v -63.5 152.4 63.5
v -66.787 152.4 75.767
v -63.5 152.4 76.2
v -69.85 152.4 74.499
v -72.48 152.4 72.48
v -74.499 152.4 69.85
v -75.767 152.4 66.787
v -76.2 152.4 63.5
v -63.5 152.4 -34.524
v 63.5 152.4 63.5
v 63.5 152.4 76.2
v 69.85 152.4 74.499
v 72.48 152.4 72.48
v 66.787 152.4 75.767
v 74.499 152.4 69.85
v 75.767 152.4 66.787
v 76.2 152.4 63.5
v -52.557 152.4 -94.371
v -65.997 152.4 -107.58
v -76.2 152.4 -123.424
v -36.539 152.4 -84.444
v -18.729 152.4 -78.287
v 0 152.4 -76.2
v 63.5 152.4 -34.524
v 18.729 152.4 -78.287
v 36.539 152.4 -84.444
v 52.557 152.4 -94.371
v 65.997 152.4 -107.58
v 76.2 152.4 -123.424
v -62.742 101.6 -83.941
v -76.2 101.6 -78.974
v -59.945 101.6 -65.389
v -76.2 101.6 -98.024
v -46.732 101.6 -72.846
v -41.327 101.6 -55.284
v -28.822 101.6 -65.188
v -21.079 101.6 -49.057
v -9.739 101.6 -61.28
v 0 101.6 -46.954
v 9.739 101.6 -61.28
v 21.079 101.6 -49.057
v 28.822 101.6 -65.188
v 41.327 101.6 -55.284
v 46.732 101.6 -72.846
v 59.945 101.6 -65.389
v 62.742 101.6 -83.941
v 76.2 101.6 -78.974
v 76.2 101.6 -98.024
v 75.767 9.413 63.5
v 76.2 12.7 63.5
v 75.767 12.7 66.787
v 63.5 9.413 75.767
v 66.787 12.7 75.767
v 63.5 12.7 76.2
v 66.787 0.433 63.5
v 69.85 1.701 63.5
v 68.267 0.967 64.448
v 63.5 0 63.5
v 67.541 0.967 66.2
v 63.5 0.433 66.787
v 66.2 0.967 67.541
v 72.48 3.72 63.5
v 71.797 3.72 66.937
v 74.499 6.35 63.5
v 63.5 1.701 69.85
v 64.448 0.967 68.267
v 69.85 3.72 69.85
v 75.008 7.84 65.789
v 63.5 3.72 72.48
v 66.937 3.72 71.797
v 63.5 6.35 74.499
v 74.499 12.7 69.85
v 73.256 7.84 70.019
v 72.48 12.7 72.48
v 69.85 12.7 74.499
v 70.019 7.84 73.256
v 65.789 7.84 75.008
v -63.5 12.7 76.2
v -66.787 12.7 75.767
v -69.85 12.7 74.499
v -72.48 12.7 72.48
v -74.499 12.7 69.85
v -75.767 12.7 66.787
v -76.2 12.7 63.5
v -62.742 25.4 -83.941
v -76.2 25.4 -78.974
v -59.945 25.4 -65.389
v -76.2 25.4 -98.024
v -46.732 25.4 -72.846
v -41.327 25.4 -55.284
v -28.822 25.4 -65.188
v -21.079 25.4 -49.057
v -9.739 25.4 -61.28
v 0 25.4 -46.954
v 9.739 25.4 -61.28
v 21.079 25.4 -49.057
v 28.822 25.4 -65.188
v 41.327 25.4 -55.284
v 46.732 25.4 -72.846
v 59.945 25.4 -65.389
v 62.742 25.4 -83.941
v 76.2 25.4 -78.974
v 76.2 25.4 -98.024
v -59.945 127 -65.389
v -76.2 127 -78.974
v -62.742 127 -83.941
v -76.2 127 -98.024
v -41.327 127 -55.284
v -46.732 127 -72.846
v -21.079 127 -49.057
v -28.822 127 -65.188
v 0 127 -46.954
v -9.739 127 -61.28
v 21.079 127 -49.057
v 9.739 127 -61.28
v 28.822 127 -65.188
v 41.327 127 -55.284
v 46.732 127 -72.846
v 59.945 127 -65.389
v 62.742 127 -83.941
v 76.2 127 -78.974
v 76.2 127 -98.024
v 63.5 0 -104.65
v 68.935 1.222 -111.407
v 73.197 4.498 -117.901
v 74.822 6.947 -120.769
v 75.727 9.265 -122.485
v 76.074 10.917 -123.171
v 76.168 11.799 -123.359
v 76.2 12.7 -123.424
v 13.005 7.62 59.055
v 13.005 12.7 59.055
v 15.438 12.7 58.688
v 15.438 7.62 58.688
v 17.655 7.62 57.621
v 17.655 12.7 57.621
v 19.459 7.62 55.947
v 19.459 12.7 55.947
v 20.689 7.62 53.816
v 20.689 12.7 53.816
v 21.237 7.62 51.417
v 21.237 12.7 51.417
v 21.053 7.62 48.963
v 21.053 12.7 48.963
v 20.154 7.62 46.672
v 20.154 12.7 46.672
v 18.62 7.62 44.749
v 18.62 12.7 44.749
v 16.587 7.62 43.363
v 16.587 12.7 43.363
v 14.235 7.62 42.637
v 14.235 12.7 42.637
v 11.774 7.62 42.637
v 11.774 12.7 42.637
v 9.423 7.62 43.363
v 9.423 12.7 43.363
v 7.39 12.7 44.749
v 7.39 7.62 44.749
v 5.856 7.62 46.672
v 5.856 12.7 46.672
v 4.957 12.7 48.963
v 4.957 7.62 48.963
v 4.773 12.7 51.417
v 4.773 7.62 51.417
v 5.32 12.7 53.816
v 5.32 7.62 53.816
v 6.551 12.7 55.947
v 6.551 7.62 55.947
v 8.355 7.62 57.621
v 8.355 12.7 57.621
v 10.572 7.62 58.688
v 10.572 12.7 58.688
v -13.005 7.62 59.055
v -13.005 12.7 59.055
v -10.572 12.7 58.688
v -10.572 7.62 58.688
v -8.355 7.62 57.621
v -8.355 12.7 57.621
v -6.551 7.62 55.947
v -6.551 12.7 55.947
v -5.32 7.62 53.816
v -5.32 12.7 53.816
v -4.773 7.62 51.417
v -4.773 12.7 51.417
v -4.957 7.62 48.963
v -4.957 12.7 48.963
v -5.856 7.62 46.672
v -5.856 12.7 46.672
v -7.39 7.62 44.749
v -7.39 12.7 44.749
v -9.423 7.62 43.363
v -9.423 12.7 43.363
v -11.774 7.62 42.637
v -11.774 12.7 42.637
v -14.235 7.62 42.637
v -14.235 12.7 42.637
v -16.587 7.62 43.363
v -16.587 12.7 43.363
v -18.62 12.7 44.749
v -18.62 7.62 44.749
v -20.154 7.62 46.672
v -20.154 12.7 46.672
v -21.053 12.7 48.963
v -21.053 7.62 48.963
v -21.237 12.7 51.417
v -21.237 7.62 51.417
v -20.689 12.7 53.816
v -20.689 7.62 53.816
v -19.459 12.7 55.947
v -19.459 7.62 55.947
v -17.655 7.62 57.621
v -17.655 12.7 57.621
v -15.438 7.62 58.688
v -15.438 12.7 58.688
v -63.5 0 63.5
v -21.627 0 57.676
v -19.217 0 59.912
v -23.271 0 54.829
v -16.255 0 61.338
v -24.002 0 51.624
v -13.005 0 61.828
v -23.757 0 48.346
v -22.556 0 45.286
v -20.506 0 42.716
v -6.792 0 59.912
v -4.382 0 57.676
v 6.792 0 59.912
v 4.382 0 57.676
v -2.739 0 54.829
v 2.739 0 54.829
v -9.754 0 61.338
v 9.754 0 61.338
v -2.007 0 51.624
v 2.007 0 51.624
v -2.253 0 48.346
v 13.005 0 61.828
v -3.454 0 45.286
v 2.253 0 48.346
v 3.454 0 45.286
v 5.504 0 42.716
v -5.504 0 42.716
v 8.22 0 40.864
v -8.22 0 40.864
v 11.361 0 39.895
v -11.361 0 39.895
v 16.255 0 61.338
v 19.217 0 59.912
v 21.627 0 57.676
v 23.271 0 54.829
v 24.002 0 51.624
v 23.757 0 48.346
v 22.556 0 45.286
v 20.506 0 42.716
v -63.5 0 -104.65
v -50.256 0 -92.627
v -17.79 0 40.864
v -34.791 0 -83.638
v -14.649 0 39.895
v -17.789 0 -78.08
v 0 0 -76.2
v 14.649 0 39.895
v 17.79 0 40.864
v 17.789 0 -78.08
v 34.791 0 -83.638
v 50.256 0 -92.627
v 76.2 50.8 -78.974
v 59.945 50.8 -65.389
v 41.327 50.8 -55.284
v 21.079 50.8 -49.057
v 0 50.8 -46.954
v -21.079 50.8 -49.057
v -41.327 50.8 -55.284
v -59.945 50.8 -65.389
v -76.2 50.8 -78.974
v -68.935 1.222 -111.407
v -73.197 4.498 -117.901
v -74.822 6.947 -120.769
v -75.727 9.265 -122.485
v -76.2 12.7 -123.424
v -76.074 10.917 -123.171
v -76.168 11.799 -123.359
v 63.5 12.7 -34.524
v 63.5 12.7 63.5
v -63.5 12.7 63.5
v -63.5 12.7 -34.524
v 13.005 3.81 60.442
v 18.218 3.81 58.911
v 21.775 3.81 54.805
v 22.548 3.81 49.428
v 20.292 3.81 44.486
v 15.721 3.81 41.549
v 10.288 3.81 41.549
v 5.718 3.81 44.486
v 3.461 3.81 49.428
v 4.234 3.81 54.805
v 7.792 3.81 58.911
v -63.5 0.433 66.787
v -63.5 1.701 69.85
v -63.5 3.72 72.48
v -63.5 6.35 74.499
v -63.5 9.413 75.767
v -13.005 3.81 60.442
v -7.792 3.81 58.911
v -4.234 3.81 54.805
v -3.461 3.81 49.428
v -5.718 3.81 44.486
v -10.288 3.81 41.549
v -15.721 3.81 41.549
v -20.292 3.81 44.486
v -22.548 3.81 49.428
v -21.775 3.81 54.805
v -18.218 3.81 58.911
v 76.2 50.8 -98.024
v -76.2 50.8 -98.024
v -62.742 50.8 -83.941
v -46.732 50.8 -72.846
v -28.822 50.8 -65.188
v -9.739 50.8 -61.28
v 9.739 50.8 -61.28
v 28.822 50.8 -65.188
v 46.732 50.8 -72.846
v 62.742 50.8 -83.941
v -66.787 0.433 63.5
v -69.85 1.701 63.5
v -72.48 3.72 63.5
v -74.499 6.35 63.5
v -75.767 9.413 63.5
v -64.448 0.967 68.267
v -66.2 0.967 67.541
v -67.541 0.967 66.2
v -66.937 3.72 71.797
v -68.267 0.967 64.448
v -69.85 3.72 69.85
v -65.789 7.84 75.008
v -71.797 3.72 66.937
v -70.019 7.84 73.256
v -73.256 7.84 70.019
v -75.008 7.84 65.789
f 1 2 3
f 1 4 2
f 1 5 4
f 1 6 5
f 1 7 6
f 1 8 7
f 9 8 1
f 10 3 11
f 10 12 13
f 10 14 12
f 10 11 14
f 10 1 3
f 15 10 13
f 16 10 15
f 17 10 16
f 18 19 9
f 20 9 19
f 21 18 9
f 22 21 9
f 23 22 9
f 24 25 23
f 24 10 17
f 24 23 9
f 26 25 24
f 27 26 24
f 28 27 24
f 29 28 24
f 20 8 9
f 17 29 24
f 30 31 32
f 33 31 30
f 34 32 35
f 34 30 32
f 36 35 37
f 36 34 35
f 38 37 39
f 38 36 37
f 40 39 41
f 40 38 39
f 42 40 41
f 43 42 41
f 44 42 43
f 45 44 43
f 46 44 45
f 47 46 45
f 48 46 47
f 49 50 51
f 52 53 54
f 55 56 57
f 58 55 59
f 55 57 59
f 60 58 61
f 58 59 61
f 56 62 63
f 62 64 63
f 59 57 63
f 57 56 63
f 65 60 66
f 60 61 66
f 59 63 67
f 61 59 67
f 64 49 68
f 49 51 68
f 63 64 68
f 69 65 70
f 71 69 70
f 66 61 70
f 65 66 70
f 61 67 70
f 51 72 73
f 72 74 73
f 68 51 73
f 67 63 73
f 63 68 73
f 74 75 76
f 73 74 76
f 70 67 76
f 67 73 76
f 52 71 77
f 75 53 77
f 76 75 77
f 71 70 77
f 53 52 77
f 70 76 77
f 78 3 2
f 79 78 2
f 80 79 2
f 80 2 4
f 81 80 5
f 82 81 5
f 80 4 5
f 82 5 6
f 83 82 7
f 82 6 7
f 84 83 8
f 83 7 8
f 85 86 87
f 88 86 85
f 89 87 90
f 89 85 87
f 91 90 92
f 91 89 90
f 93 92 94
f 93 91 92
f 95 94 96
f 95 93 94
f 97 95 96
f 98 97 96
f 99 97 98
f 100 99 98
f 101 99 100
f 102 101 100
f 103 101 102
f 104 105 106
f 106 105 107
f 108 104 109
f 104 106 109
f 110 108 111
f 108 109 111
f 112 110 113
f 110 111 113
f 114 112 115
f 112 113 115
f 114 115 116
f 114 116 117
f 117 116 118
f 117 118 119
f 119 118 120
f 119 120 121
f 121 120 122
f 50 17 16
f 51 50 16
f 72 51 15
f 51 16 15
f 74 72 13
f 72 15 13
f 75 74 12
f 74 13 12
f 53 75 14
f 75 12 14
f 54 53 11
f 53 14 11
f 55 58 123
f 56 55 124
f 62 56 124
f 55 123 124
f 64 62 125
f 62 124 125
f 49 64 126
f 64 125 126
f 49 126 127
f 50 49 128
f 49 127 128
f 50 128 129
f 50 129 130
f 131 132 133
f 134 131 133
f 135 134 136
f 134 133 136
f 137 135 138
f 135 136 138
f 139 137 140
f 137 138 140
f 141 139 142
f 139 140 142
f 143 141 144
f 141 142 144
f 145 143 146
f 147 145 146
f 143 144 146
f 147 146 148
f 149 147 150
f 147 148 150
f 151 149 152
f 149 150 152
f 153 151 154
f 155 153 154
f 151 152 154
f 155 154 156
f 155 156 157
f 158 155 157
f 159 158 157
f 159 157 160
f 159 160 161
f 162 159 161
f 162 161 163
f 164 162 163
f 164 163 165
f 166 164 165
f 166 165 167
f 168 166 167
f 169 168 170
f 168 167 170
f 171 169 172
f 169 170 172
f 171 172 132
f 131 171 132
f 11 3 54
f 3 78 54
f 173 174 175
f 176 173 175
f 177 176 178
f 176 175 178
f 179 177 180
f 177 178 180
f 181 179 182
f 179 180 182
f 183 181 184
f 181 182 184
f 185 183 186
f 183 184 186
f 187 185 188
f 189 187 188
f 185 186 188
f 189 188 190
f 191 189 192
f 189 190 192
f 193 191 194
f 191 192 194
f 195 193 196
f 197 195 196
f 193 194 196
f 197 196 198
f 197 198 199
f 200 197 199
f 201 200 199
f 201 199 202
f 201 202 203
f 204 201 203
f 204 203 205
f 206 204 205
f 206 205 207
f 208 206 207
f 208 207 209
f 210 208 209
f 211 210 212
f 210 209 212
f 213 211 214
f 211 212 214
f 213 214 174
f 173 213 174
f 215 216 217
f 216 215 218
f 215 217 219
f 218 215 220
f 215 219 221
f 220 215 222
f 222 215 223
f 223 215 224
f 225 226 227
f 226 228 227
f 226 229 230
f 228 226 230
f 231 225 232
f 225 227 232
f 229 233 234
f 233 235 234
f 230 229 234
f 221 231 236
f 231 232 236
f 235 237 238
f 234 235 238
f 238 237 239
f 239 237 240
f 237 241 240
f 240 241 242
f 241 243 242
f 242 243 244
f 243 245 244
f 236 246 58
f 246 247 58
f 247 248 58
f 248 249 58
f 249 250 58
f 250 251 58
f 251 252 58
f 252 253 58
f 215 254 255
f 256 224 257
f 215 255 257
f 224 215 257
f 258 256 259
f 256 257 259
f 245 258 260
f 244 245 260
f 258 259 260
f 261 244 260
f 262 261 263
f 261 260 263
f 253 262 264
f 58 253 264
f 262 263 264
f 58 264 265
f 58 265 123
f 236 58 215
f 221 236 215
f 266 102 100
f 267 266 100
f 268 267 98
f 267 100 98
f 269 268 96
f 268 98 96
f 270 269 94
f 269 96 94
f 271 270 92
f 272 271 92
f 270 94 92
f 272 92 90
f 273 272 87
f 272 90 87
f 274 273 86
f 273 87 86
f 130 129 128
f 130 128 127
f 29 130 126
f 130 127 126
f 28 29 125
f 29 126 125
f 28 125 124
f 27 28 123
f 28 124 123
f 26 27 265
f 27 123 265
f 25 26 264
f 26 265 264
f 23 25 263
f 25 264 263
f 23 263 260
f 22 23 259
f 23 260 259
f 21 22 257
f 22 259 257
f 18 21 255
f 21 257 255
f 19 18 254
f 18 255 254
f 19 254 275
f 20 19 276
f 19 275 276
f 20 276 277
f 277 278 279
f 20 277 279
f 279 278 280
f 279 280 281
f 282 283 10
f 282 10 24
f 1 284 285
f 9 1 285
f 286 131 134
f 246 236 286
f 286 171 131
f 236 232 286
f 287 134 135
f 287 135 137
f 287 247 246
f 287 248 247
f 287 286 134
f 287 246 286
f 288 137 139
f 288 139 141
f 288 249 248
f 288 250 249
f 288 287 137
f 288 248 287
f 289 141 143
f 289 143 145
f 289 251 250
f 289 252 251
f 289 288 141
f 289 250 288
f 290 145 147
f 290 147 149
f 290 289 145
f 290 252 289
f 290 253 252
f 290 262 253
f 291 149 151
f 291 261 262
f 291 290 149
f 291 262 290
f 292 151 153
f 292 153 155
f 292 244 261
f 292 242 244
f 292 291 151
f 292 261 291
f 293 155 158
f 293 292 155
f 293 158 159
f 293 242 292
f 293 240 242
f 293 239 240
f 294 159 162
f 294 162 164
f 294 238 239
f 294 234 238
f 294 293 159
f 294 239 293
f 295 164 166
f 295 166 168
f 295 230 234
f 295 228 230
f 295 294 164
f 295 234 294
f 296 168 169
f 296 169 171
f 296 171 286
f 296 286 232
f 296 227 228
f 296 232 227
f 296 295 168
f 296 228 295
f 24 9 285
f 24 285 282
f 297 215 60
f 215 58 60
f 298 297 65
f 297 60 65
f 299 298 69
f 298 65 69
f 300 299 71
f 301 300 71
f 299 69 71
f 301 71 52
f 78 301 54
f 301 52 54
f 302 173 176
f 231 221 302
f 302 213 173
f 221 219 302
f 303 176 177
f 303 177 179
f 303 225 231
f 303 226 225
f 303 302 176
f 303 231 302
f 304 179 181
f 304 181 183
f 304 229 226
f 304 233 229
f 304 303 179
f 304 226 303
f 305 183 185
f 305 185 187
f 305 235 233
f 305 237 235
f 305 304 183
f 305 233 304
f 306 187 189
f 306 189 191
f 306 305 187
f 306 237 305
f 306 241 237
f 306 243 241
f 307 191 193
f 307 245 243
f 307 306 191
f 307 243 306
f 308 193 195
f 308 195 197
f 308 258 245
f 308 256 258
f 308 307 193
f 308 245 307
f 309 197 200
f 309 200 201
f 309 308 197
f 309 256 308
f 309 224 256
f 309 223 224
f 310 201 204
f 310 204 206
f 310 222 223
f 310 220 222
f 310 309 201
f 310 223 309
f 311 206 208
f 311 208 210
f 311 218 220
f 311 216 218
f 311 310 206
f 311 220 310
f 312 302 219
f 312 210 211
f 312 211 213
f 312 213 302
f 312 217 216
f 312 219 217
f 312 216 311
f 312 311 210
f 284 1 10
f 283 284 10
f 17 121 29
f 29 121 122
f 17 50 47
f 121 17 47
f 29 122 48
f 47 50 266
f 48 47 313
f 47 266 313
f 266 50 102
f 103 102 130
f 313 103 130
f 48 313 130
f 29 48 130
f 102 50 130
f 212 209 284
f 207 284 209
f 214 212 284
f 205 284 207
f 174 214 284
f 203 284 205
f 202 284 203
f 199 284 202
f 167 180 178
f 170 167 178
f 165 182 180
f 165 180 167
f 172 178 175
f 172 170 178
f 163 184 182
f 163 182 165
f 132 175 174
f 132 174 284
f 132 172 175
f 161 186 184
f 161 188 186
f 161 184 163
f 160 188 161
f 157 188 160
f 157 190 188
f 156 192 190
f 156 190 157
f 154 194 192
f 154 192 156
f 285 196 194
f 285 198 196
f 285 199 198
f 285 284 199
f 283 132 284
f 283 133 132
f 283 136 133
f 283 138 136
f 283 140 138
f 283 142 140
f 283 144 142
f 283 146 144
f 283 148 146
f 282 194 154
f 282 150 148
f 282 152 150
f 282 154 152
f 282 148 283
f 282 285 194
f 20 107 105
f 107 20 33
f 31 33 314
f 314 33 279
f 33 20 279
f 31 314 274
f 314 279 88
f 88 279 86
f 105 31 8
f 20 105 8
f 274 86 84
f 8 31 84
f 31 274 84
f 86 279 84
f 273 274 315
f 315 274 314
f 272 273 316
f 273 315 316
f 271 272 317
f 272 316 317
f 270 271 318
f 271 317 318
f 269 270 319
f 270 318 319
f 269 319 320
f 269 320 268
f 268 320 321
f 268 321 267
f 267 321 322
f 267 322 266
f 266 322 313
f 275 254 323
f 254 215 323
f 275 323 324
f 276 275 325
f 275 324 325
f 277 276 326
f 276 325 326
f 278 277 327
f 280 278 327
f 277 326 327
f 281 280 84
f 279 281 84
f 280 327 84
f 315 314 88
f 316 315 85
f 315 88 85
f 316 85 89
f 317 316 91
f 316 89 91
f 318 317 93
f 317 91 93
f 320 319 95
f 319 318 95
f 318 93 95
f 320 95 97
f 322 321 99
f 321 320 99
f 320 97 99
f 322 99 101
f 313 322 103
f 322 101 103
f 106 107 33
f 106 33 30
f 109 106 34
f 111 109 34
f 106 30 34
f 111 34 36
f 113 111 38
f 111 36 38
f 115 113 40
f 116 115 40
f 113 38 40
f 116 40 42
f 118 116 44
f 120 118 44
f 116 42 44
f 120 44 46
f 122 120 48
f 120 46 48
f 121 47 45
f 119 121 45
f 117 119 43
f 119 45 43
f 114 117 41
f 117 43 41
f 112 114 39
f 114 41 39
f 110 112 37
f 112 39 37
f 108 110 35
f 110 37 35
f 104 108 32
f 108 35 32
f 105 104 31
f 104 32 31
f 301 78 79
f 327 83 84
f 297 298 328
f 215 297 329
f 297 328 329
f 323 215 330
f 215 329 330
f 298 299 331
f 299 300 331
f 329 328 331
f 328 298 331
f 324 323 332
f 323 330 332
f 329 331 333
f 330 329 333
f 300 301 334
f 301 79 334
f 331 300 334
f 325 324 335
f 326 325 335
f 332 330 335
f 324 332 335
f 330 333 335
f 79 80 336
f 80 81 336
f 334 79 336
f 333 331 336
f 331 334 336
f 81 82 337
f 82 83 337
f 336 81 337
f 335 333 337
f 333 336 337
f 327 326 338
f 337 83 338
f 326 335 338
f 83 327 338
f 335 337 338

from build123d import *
from OCP.BRepFilletAPI import BRepFilletAPI_MakeChamfer

# Parameters (mm, degrees)
SKETCH2_W           = 152.4
SKETCH2_H           = 152.4
BOSS_EXTRUDE1_DEPTH = 25.4
BOSS_EXTRUDE2_DEPTH = 101.6
BOSS_EXTRUDE5_START = 50.8
BOSS_EXTRUDE5_DEPTH = 50.8
BOSS_EXTRUDE6_DEPTH = 25.4
SKETCH6_W           = 127
SKETCH6_H           = 98.02354915
CUT_EXTRUDE1_DEPTH  = 139.7
SKETCH7_R           = 8.255
CUT_EXTRUDE2_DEPTH  = 12.7
CHAMFER1_SIZE       = 7.62
CHAMFER1_SIZE2      = 2.773453185
FILLET1_R           = 12.7


with BuildPart() as part:
    # Sketch2 → Boss-Extrude1 (new body)
    with BuildSketch(Plane(origin=(0, 0, 0), x_dir=(1, 0, 0), z_dir=(0, 1, 0))):
        with BuildLine():
            Line((0, 76.2), (76.2, 76.2))
            Line((76.2, 76.2), (76.2, 123.42354915))
            ThreePointArc((76.2, 123.42354915), (44.823274072, 88.963087986), (0, 76.2))
        make_face()
        with BuildLine():
            Line((-76.2, 123.42354915), (-76.2, 76.2))
            Line((-76.2, 76.2), (0, 76.2))
            ThreePointArc((0, 76.2), (-44.823274072, 88.963087986), (-76.2, 123.42354915))
        make_face()
        Rectangle(SKETCH2_W, SKETCH2_H)
    extrude(amount=BOSS_EXTRUDE1_DEPTH)

    # Sketch3 → Boss-Extrude2 (add)
    with BuildSketch(Plane(origin=(0, 25.4, 0), x_dir=(1, 0, 0), z_dir=(0, 1, 0))):
        with BuildLine():
            ThreePointArc((76.2, 123.42354915), (0, 76.2), (-76.2, 123.42354915))
            Line((-76.2, 123.42354915), (-76.2, 98.02354915))
            ThreePointArc((-76.2, 98.02354915), (0, 60.787742764), (76.2, 98.02354915))
            Line((76.2, 98.02354915), (76.2, 123.42354915))
        make_face()
        with BuildLine():
            ThreePointArc((76.2, 78.97354915), (0, 46.95399651), (-76.2, 78.97354915))
            Line((-76.2, 78.97354915), (-76.2, -76.2))
            Line((-76.2, -76.2), (76.2, -76.2))
            Line((76.2, -76.2), (76.2, 78.97354915))
        make_face()
    extrude(amount=BOSS_EXTRUDE2_DEPTH)

    # Sketch5 → Boss-Extrude5 (add)
    with BuildSketch(Plane(origin=(0, 0, 0), x_dir=(1, 0, 0), z_dir=(0, 1, 0)).offset(BOSS_EXTRUDE5_START)):
        with BuildLine():
            Line((-76.2, 123.42354915), (-76.2, -76.2))
            Line((-76.2, -76.2), (76.2, -76.2))
            Line((76.2, -76.2), (76.2, 123.42354915))
            ThreePointArc((76.2, 123.42354915), (0, 76.2), (-76.2, 123.42354915))
        make_face()
    extrude(amount=BOSS_EXTRUDE5_DEPTH)

    # Sketch4 → Boss-Extrude6 (add)
    with BuildSketch(Plane(origin=(0, 127, 0), x_dir=(1, 0, 0), z_dir=(0, 1, 0))):
        with BuildLine():
            Line((-76.2, 123.42354915), (-76.2, -76.2))
            Line((-76.2, -76.2), (76.2, -76.2))
            Line((76.2, -76.2), (76.2, 123.42354915))
            ThreePointArc((76.2, 123.42354915), (0, 76.2), (-76.2, 123.42354915))
        make_face()
    extrude(amount=BOSS_EXTRUDE6_DEPTH)

    # Sketch6 → Cut-Extrude1 (cut)
    with BuildSketch(Plane(origin=(0, 152.4, 0), x_dir=(1, 0, 0), z_dir=(0, 1, 0))):
        with Locations((0, -14.488225425)):
            Rectangle(SKETCH6_W, SKETCH6_H)
    extrude(amount=-CUT_EXTRUDE1_DEPTH, mode=Mode.SUBTRACT)

    # Sketch7 → Cut-Extrude2 (cut)
    with BuildSketch(Plane(origin=(0, 12.7, 0), x_dir=(1, 0, 0), z_dir=(0, 1, 0))):
        with Locations(Location((-13.0048, -50.8, 0), (0, 0, 270))):
            Circle(SKETCH7_R)
        with Locations(Location((13.0048, -50.8, 0), (0, 0, 270))):
            Circle(SKETCH7_R)
    extrude(amount=-CUT_EXTRUDE2_DEPTH, mode=Mode.SUBTRACT)

    # Chamfer1: one chamfer whose edges measure the first distance from different faces: ONE call of the kernel's chamfer builder (chamfer() names one face for all edges)
    chamfer1_edges_1 = [part.edges().sort_by_distance(p)[0] for p in [
        (-13.0048, 0, 42.545),
    ]]
    chamfer1_side_1 = [part.faces().sort_by_distance(p)[0] for p in [
        (-13.0048, 6.35, 42.545),
    ]]
    chamfer1_edges_2 = [part.edges().sort_by_distance(p)[0] for p in [
        (13.0048, 0, 42.545),
    ]]
    chamfer1_side_2 = [part.faces().sort_by_distance(p)[0] for p in [
        (13.0048, 6.35, 42.545),
    ]]
    chamfer1 = BRepFilletAPI_MakeChamfer(part.part.solid().wrapped)
    for e in chamfer1_edges_1:
        chamfer1.Add(CHAMFER1_SIZE, CHAMFER1_SIZE2, e.wrapped, chamfer1_side_1[0].wrapped)  # the first distance lies on this face
    for e in chamfer1_edges_2:
        chamfer1.Add(CHAMFER1_SIZE, CHAMFER1_SIZE2, e.wrapped, chamfer1_side_2[0].wrapped)  # the first distance lies on this face
    add(Compound.cast(chamfer1.Shape()), mode=Mode.REPLACE)

    # Fillet1
    fillet1_edges = [part.edges().sort_by_distance(p)[0] for p in [
        (76.2, 76.2, 76.2),
        (-76.2, 76.2, 76.2),
        (76.2, 0, -23.611774575),
        (0, 0, 76.2),
        (-76.2, 0, -23.611774575),
    ]]
    fillet(fillet1_edges, radius=FILLET1_R)


solid = part.part
